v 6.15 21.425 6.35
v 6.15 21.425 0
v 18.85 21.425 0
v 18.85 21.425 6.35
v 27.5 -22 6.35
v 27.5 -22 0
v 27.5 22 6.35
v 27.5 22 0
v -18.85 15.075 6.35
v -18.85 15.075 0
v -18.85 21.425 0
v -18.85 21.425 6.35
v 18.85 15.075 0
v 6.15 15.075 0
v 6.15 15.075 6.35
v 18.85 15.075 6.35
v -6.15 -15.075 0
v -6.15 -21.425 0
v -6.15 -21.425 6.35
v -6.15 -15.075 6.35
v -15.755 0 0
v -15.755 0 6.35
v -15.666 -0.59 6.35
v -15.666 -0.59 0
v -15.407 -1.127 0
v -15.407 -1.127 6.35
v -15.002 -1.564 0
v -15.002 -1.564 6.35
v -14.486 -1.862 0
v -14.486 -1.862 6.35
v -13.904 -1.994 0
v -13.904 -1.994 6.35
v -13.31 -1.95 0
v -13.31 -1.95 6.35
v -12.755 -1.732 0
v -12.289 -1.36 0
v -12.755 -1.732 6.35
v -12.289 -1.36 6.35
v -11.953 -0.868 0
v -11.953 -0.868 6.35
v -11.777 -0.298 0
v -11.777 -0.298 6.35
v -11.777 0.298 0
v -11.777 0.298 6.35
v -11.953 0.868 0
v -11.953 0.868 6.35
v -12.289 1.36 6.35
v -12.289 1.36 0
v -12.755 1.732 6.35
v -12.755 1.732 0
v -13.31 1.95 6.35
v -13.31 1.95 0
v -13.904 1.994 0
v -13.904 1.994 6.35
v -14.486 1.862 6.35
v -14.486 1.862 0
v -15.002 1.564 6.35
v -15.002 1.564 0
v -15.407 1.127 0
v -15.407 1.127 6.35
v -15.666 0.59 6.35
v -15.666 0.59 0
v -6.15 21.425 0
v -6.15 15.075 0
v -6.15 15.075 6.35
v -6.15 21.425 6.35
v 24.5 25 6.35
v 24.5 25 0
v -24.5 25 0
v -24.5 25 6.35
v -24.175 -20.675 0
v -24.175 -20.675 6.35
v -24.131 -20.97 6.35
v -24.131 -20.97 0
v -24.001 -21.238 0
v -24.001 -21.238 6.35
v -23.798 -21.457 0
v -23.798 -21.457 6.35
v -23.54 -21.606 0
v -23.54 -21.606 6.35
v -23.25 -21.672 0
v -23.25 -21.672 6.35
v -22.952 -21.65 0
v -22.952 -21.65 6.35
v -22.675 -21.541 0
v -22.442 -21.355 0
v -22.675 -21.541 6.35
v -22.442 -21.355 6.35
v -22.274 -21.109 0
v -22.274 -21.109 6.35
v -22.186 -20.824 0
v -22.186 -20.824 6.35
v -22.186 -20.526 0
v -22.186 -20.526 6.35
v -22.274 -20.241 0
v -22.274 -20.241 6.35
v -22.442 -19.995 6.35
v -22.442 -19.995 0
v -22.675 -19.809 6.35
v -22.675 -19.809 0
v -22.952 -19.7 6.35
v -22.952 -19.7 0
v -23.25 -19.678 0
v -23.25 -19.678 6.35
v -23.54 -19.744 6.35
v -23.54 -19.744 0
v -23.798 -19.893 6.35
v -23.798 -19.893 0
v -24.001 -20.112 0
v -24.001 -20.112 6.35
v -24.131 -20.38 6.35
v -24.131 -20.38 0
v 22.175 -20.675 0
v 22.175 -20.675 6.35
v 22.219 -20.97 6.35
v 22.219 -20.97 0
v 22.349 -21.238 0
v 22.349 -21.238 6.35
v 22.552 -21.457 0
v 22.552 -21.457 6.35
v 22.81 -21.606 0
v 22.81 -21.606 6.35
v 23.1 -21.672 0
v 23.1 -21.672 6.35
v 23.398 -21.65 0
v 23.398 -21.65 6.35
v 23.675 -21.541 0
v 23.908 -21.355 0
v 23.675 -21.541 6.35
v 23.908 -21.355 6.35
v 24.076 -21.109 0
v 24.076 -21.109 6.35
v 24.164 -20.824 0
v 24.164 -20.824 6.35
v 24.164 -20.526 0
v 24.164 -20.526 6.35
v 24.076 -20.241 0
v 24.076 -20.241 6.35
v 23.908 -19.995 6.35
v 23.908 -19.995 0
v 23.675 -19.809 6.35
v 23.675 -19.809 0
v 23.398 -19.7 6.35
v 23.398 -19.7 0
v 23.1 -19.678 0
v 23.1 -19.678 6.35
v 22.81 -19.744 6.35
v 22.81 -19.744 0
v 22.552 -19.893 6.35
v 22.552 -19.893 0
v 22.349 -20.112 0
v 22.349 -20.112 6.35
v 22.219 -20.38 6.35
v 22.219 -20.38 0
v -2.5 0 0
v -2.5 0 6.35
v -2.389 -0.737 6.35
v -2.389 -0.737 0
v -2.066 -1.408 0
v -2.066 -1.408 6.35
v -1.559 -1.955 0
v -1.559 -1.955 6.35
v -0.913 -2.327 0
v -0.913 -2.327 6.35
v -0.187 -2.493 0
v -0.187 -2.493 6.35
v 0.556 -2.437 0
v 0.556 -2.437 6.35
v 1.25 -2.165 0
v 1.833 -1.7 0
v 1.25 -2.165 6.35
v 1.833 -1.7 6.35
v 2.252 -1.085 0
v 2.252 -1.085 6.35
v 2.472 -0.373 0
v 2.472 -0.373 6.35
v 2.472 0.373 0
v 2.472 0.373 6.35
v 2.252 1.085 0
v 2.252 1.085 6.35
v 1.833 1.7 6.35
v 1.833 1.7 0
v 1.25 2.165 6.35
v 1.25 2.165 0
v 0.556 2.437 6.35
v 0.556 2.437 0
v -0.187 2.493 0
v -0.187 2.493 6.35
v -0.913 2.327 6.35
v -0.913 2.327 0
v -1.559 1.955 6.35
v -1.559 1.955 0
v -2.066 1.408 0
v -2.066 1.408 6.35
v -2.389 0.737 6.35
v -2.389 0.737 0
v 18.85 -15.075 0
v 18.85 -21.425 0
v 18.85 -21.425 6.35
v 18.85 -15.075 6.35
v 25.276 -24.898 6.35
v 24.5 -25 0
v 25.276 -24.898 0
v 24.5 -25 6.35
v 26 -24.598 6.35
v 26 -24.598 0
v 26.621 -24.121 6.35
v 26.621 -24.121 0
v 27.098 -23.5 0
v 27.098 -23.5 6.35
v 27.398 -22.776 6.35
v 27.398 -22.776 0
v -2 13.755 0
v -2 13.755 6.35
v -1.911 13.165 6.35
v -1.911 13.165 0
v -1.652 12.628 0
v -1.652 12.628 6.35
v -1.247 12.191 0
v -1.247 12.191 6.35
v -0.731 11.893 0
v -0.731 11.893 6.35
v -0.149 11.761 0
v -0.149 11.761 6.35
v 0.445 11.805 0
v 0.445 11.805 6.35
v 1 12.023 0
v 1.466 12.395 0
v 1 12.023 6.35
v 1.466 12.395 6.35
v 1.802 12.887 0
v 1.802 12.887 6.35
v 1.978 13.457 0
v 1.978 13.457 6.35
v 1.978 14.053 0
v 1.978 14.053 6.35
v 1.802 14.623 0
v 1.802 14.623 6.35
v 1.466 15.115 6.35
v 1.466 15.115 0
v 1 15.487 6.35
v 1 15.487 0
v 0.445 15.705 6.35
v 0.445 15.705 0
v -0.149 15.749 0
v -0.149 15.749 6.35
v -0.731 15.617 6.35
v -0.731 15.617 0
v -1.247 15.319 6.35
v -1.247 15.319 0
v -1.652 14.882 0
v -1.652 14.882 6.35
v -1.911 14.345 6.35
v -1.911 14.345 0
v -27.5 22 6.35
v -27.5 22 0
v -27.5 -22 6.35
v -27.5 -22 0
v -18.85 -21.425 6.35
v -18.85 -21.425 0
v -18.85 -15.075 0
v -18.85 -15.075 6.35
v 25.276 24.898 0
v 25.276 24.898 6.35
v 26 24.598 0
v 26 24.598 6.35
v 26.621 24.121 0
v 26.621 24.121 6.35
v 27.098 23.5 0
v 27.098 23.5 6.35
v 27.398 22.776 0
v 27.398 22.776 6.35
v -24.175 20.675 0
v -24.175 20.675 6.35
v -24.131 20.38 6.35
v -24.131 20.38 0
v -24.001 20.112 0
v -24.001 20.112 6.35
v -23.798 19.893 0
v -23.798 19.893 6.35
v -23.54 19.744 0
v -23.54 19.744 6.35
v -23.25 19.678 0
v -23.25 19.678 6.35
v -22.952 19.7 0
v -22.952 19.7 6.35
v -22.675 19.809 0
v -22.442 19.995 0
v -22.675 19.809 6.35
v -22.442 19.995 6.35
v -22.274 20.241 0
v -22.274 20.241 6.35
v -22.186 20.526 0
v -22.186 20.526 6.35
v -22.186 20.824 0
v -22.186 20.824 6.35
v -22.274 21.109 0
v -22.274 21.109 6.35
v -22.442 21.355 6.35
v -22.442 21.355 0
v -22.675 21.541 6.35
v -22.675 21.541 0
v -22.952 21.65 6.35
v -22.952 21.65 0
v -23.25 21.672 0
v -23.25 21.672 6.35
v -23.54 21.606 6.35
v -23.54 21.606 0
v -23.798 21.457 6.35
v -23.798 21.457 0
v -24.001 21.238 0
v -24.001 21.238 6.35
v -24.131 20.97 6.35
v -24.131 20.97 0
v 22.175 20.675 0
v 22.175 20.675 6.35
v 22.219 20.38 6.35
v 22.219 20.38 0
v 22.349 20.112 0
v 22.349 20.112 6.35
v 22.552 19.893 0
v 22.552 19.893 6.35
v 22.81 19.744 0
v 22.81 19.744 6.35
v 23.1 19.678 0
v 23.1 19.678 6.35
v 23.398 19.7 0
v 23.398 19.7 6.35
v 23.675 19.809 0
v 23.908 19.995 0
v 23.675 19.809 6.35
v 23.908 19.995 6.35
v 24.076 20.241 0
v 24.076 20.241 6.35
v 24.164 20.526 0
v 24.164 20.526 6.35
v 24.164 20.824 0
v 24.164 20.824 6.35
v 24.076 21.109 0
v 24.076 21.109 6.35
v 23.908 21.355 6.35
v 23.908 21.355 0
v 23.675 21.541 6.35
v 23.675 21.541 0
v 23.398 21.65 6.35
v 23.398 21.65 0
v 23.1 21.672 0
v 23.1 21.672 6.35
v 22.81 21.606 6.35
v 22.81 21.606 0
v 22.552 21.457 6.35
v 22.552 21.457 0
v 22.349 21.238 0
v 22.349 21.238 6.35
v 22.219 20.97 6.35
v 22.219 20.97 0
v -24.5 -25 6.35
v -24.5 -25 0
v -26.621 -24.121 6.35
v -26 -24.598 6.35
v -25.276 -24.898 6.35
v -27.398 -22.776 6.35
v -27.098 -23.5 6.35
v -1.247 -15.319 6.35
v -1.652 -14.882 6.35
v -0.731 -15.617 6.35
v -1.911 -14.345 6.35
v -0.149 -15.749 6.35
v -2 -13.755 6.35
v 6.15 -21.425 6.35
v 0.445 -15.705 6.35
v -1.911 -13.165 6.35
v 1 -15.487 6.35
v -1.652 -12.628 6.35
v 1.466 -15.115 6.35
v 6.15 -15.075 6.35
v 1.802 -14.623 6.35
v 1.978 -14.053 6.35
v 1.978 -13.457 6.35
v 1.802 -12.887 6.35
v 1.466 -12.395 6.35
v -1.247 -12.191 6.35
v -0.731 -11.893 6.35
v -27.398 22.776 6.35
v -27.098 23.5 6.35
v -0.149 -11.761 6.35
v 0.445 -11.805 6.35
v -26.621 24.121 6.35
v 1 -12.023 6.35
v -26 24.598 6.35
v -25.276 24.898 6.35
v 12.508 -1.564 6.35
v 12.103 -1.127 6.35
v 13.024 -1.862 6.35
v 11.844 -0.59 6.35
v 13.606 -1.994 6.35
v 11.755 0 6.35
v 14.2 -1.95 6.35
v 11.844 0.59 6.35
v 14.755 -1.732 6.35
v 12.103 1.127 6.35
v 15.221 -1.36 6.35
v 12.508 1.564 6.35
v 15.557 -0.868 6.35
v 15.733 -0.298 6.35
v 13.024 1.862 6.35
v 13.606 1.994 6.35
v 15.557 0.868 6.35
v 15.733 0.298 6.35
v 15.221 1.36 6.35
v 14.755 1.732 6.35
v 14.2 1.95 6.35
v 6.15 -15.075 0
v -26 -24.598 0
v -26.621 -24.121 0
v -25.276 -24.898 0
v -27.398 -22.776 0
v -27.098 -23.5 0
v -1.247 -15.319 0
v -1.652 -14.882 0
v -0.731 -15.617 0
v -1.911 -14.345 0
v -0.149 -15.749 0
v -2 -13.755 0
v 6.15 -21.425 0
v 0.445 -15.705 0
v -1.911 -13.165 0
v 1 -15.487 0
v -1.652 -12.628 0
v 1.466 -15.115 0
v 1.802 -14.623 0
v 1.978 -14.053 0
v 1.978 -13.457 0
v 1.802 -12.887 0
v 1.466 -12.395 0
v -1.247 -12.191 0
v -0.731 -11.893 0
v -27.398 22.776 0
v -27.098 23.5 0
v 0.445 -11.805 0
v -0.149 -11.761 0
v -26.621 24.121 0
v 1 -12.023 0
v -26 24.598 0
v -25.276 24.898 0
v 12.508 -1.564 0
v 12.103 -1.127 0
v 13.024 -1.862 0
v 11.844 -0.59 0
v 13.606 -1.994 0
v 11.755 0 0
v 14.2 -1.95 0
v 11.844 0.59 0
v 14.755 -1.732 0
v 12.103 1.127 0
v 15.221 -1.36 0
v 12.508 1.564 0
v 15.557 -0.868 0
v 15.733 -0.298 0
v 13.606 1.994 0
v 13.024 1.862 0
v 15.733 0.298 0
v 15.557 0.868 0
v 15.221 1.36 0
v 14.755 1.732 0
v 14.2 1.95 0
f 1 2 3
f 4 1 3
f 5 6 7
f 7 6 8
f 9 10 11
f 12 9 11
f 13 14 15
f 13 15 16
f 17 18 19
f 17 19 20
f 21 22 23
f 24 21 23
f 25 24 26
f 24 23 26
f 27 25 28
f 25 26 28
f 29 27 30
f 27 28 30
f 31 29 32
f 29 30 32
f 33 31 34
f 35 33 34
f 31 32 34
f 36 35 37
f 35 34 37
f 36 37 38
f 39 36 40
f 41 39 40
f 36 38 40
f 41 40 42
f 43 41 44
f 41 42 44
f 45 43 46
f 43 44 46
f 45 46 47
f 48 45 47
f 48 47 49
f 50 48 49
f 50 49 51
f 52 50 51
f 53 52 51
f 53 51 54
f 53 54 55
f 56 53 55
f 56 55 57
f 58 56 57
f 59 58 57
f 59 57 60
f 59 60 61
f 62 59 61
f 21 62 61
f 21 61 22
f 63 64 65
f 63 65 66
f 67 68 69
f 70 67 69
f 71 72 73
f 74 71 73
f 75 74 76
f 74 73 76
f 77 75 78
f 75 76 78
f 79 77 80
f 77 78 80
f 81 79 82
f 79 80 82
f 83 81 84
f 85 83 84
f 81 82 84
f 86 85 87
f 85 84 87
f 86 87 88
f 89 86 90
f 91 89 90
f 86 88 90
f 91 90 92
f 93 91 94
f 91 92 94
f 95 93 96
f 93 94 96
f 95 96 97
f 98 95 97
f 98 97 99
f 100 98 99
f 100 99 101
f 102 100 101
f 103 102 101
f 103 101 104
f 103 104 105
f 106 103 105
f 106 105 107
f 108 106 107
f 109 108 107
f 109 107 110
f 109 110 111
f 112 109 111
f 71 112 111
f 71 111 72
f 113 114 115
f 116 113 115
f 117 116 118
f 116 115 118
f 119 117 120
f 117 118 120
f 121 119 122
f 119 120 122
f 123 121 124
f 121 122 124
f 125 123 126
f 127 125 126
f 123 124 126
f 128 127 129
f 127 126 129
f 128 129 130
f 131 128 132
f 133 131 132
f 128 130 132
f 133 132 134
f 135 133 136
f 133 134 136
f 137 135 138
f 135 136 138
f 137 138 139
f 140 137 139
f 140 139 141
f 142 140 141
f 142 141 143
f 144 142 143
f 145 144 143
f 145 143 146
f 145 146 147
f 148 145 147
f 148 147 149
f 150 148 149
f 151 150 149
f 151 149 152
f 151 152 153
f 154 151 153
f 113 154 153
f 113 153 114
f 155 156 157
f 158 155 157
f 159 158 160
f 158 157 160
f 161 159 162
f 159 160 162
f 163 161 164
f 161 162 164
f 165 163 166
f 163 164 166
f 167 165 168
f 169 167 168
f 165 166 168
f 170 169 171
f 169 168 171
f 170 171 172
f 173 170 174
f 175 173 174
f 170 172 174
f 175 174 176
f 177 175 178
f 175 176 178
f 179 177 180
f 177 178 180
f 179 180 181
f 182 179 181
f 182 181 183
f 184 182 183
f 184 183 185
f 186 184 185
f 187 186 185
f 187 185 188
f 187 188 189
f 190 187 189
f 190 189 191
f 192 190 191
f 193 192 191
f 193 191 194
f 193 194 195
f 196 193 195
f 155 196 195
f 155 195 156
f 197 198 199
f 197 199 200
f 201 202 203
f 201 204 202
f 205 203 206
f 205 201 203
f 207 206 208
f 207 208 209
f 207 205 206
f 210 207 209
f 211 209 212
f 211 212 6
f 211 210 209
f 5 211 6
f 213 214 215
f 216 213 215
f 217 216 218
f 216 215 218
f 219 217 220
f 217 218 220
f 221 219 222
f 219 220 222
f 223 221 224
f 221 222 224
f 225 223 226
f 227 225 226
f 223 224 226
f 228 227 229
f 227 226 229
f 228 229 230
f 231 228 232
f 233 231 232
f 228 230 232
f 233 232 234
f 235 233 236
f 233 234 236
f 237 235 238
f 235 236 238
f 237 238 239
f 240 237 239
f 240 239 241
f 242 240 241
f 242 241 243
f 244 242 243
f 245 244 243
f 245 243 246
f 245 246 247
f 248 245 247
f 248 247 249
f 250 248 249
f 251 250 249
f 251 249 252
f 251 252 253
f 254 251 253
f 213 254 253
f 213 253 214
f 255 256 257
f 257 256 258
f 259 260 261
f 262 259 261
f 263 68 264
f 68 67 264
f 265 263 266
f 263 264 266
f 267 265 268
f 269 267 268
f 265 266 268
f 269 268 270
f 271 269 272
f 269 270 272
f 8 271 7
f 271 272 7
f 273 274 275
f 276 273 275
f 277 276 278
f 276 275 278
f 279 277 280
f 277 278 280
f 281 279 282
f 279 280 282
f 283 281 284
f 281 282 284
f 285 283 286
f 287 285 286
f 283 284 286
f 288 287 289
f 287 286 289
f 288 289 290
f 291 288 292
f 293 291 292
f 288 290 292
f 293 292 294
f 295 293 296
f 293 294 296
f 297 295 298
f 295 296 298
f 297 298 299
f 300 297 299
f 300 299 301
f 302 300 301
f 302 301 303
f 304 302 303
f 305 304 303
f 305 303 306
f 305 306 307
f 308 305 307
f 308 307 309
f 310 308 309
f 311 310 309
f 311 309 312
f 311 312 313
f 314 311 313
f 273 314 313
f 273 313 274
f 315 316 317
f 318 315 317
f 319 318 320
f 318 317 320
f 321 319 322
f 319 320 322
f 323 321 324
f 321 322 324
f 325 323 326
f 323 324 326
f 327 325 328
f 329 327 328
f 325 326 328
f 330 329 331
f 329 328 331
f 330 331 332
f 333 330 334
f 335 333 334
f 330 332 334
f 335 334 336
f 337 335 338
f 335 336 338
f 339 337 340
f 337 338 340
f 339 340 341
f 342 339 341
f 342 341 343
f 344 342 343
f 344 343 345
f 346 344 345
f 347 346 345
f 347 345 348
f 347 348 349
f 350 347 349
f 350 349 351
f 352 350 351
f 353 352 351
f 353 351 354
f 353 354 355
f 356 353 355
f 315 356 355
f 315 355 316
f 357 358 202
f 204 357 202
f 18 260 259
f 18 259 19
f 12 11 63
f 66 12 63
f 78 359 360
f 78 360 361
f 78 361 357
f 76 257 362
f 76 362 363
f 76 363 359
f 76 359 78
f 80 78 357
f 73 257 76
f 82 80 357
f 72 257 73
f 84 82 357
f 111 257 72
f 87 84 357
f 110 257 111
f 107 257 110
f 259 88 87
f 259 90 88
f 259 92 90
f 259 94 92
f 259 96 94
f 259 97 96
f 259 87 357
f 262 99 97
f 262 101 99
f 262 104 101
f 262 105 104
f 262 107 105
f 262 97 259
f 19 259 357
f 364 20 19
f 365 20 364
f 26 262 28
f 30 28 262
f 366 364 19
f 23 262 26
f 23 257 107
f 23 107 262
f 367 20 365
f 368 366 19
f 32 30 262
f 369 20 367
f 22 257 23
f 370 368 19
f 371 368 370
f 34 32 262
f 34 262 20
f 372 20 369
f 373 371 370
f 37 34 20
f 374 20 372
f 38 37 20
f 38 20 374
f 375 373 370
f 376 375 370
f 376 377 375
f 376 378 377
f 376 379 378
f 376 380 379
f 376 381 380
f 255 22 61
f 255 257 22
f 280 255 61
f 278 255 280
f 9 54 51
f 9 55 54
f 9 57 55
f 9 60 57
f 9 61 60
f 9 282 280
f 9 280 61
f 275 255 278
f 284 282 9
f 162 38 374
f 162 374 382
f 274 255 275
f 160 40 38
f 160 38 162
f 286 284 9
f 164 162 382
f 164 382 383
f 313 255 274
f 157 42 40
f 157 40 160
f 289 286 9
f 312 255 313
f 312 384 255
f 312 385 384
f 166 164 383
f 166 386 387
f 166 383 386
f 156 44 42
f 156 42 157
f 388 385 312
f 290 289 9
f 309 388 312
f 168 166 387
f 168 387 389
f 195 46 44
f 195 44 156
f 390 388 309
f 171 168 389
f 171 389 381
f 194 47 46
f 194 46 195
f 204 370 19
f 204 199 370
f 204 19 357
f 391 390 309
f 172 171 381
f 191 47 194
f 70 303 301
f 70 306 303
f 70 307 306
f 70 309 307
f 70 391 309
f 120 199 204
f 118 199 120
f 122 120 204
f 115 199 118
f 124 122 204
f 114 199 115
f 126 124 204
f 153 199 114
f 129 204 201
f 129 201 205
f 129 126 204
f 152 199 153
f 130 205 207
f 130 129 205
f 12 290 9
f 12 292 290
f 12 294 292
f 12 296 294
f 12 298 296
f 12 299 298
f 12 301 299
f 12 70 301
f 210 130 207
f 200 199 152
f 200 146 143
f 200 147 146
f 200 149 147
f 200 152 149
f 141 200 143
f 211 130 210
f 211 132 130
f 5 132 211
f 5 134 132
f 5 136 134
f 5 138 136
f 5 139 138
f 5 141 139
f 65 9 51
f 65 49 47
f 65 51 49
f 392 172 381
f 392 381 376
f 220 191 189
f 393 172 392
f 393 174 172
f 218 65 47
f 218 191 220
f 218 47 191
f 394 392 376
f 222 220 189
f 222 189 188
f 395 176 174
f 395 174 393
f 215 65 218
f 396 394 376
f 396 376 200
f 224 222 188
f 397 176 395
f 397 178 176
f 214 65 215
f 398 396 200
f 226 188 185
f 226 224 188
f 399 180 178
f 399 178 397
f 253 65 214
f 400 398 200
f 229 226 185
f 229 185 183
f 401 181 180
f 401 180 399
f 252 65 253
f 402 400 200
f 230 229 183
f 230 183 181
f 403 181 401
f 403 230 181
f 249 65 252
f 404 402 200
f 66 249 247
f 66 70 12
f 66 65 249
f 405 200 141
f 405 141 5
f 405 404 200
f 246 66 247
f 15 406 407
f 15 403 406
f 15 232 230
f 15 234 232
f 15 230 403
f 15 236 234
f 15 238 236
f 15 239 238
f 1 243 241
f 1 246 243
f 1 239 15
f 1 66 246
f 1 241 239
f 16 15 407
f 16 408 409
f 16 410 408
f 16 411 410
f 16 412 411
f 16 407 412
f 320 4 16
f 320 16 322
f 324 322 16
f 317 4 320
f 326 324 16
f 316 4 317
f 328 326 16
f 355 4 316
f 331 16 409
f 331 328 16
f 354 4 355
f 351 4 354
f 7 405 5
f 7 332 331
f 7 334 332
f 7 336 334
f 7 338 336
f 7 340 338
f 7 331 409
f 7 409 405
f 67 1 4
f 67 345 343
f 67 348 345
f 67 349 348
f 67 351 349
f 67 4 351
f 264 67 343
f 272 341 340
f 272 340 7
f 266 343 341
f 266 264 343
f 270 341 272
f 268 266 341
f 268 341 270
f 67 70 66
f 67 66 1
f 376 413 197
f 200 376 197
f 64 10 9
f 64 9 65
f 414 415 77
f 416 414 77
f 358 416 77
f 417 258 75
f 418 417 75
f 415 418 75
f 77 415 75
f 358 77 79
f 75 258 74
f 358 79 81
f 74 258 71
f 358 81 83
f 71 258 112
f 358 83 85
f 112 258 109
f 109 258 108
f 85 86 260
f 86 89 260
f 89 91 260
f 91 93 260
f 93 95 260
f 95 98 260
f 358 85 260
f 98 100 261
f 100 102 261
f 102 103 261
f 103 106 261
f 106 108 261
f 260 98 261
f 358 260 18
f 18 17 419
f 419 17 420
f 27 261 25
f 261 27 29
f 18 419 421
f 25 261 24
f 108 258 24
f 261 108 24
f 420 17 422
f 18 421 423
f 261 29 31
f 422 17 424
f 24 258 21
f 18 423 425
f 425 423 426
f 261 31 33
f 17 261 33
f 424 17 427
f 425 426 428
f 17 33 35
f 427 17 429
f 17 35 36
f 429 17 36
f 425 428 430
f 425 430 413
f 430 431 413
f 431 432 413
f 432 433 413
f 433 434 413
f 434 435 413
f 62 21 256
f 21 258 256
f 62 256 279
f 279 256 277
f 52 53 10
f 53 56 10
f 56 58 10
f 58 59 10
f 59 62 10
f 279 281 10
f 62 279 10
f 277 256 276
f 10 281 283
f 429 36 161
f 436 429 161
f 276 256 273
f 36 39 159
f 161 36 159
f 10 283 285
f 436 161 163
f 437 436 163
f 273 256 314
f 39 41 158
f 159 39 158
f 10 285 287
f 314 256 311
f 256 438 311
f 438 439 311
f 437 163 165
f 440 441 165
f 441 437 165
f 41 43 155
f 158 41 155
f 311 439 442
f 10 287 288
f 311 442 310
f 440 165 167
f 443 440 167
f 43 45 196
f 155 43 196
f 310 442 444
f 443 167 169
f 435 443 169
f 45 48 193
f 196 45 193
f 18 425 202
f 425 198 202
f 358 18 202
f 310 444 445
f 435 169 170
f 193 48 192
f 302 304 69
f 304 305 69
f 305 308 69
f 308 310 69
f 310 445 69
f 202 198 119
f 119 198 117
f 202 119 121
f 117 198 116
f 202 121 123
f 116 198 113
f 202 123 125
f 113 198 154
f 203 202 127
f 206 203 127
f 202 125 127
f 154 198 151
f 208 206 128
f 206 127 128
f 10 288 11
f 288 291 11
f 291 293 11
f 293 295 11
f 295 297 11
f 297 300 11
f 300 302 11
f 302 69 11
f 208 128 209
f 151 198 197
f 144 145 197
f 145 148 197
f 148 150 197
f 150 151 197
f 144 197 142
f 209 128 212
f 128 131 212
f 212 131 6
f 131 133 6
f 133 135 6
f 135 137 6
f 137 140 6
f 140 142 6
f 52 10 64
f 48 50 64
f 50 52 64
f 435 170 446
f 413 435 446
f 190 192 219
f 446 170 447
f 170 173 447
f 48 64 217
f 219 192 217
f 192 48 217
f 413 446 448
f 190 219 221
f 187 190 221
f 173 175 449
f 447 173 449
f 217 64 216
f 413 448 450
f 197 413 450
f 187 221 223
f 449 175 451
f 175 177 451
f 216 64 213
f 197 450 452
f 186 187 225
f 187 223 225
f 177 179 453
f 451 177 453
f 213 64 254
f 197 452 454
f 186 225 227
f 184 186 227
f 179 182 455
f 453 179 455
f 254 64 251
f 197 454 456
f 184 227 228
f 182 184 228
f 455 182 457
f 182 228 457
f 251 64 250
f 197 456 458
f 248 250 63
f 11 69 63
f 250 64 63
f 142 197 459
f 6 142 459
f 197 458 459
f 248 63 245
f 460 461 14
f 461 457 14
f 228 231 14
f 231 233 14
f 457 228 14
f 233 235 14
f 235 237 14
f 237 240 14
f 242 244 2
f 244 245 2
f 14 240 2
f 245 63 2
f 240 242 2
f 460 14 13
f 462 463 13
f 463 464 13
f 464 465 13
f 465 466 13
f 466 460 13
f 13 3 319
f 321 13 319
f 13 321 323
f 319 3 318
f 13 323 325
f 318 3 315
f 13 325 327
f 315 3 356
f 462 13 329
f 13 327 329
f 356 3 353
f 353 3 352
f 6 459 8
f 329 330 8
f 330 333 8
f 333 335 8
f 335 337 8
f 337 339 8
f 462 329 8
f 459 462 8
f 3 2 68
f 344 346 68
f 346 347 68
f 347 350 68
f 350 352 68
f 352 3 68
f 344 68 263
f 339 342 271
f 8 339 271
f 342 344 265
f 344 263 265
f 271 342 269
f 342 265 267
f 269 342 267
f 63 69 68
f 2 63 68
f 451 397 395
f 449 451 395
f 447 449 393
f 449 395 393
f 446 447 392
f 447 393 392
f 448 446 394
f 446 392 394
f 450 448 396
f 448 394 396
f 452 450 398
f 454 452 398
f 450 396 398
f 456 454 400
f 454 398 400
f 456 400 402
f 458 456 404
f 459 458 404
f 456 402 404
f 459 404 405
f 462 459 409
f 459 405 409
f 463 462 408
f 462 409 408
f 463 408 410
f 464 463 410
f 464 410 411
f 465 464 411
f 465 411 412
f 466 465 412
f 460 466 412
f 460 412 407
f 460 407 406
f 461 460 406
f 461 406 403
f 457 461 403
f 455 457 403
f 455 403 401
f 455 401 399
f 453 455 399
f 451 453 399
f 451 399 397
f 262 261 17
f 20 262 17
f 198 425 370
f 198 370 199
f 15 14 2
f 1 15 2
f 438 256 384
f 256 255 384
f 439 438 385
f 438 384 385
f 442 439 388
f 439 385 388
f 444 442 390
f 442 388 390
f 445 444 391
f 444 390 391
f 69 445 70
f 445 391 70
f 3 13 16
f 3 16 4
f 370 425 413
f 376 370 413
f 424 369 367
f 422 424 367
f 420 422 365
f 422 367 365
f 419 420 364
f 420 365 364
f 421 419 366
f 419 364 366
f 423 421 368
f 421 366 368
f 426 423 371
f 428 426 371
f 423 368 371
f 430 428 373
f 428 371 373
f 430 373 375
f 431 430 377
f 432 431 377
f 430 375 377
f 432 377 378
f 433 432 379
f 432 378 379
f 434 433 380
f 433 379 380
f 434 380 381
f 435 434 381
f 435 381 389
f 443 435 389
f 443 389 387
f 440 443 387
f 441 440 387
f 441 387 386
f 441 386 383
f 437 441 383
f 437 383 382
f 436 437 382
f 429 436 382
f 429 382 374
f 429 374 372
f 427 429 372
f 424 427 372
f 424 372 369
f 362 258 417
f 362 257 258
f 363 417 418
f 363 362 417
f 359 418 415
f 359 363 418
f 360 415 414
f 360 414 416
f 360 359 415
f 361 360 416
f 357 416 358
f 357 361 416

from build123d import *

# Parameters (mm, degrees)
F0_W     = 12.7
F0_H     = 6.35
F1_DEPTH = 6.35
F2_R     = 3
F3_D     = 5
F4_D     = 4
F5_D     = 2


with BuildPart() as f1:
    # F0 (on Top) → F1 (new body)
    with BuildSketch(Plane.XY):
        Polygon((0, 25), (-27.5, 25), (-27.5, -25), (27.5, -25), (27.5, 25), align=None)
        with Locations((-12.5, -18.25)):
            Rectangle(F0_W, F0_H, mode=Mode.SUBTRACT)
        with Locations((12.5, -18.25)):
            Rectangle(F0_W, F0_H, mode=Mode.SUBTRACT)
        with Locations((-12.5, 18.25)):
            Rectangle(F0_W, F0_H, mode=Mode.SUBTRACT)
        with Locations((12.5, 18.25)):
            Rectangle(F0_W, F0_H, mode=Mode.SUBTRACT)
    extrude(amount=F1_DEPTH)

    # F2
    f2_edges = [f1.edges().sort_by_distance(p)[0] for p in [
        (27.5, -25, 3.175),
        (27.5, 25, 3.175),
        (-27.5, -25, 3.175),
        (-27.5, 25, 3.175),
    ]]
    fillet(f2_edges, radius=F2_R)

    # F3 (through all)
    with Locations(Plane(origin=(0, 0, 0), x_dir=(1, 0, 0), z_dir=(0, 0, -1))):
        with Locations((0, 0)):
            Hole(F3_D / 2)

    # F4 (through all)
    with Locations(Plane(origin=(0, 0, 0), x_dir=(1, 0, 0), z_dir=(0, 0, -1))):
        with Locations((-13.755, 0), (0, -13.755), (13.755, 0), (0, 13.755)):
            Hole(F4_D / 2)

    # F5 (through all)
    with Locations(Plane(origin=(0, 0, 0), x_dir=(1, 0, 0), z_dir=(0, 0, -1))):
        with Locations((-23.175, 20.675), (23.175, 20.675), (23.175, -20.675), (-23.175, -20.675)):
            Hole(F5_D / 2)


solid = f1.part
